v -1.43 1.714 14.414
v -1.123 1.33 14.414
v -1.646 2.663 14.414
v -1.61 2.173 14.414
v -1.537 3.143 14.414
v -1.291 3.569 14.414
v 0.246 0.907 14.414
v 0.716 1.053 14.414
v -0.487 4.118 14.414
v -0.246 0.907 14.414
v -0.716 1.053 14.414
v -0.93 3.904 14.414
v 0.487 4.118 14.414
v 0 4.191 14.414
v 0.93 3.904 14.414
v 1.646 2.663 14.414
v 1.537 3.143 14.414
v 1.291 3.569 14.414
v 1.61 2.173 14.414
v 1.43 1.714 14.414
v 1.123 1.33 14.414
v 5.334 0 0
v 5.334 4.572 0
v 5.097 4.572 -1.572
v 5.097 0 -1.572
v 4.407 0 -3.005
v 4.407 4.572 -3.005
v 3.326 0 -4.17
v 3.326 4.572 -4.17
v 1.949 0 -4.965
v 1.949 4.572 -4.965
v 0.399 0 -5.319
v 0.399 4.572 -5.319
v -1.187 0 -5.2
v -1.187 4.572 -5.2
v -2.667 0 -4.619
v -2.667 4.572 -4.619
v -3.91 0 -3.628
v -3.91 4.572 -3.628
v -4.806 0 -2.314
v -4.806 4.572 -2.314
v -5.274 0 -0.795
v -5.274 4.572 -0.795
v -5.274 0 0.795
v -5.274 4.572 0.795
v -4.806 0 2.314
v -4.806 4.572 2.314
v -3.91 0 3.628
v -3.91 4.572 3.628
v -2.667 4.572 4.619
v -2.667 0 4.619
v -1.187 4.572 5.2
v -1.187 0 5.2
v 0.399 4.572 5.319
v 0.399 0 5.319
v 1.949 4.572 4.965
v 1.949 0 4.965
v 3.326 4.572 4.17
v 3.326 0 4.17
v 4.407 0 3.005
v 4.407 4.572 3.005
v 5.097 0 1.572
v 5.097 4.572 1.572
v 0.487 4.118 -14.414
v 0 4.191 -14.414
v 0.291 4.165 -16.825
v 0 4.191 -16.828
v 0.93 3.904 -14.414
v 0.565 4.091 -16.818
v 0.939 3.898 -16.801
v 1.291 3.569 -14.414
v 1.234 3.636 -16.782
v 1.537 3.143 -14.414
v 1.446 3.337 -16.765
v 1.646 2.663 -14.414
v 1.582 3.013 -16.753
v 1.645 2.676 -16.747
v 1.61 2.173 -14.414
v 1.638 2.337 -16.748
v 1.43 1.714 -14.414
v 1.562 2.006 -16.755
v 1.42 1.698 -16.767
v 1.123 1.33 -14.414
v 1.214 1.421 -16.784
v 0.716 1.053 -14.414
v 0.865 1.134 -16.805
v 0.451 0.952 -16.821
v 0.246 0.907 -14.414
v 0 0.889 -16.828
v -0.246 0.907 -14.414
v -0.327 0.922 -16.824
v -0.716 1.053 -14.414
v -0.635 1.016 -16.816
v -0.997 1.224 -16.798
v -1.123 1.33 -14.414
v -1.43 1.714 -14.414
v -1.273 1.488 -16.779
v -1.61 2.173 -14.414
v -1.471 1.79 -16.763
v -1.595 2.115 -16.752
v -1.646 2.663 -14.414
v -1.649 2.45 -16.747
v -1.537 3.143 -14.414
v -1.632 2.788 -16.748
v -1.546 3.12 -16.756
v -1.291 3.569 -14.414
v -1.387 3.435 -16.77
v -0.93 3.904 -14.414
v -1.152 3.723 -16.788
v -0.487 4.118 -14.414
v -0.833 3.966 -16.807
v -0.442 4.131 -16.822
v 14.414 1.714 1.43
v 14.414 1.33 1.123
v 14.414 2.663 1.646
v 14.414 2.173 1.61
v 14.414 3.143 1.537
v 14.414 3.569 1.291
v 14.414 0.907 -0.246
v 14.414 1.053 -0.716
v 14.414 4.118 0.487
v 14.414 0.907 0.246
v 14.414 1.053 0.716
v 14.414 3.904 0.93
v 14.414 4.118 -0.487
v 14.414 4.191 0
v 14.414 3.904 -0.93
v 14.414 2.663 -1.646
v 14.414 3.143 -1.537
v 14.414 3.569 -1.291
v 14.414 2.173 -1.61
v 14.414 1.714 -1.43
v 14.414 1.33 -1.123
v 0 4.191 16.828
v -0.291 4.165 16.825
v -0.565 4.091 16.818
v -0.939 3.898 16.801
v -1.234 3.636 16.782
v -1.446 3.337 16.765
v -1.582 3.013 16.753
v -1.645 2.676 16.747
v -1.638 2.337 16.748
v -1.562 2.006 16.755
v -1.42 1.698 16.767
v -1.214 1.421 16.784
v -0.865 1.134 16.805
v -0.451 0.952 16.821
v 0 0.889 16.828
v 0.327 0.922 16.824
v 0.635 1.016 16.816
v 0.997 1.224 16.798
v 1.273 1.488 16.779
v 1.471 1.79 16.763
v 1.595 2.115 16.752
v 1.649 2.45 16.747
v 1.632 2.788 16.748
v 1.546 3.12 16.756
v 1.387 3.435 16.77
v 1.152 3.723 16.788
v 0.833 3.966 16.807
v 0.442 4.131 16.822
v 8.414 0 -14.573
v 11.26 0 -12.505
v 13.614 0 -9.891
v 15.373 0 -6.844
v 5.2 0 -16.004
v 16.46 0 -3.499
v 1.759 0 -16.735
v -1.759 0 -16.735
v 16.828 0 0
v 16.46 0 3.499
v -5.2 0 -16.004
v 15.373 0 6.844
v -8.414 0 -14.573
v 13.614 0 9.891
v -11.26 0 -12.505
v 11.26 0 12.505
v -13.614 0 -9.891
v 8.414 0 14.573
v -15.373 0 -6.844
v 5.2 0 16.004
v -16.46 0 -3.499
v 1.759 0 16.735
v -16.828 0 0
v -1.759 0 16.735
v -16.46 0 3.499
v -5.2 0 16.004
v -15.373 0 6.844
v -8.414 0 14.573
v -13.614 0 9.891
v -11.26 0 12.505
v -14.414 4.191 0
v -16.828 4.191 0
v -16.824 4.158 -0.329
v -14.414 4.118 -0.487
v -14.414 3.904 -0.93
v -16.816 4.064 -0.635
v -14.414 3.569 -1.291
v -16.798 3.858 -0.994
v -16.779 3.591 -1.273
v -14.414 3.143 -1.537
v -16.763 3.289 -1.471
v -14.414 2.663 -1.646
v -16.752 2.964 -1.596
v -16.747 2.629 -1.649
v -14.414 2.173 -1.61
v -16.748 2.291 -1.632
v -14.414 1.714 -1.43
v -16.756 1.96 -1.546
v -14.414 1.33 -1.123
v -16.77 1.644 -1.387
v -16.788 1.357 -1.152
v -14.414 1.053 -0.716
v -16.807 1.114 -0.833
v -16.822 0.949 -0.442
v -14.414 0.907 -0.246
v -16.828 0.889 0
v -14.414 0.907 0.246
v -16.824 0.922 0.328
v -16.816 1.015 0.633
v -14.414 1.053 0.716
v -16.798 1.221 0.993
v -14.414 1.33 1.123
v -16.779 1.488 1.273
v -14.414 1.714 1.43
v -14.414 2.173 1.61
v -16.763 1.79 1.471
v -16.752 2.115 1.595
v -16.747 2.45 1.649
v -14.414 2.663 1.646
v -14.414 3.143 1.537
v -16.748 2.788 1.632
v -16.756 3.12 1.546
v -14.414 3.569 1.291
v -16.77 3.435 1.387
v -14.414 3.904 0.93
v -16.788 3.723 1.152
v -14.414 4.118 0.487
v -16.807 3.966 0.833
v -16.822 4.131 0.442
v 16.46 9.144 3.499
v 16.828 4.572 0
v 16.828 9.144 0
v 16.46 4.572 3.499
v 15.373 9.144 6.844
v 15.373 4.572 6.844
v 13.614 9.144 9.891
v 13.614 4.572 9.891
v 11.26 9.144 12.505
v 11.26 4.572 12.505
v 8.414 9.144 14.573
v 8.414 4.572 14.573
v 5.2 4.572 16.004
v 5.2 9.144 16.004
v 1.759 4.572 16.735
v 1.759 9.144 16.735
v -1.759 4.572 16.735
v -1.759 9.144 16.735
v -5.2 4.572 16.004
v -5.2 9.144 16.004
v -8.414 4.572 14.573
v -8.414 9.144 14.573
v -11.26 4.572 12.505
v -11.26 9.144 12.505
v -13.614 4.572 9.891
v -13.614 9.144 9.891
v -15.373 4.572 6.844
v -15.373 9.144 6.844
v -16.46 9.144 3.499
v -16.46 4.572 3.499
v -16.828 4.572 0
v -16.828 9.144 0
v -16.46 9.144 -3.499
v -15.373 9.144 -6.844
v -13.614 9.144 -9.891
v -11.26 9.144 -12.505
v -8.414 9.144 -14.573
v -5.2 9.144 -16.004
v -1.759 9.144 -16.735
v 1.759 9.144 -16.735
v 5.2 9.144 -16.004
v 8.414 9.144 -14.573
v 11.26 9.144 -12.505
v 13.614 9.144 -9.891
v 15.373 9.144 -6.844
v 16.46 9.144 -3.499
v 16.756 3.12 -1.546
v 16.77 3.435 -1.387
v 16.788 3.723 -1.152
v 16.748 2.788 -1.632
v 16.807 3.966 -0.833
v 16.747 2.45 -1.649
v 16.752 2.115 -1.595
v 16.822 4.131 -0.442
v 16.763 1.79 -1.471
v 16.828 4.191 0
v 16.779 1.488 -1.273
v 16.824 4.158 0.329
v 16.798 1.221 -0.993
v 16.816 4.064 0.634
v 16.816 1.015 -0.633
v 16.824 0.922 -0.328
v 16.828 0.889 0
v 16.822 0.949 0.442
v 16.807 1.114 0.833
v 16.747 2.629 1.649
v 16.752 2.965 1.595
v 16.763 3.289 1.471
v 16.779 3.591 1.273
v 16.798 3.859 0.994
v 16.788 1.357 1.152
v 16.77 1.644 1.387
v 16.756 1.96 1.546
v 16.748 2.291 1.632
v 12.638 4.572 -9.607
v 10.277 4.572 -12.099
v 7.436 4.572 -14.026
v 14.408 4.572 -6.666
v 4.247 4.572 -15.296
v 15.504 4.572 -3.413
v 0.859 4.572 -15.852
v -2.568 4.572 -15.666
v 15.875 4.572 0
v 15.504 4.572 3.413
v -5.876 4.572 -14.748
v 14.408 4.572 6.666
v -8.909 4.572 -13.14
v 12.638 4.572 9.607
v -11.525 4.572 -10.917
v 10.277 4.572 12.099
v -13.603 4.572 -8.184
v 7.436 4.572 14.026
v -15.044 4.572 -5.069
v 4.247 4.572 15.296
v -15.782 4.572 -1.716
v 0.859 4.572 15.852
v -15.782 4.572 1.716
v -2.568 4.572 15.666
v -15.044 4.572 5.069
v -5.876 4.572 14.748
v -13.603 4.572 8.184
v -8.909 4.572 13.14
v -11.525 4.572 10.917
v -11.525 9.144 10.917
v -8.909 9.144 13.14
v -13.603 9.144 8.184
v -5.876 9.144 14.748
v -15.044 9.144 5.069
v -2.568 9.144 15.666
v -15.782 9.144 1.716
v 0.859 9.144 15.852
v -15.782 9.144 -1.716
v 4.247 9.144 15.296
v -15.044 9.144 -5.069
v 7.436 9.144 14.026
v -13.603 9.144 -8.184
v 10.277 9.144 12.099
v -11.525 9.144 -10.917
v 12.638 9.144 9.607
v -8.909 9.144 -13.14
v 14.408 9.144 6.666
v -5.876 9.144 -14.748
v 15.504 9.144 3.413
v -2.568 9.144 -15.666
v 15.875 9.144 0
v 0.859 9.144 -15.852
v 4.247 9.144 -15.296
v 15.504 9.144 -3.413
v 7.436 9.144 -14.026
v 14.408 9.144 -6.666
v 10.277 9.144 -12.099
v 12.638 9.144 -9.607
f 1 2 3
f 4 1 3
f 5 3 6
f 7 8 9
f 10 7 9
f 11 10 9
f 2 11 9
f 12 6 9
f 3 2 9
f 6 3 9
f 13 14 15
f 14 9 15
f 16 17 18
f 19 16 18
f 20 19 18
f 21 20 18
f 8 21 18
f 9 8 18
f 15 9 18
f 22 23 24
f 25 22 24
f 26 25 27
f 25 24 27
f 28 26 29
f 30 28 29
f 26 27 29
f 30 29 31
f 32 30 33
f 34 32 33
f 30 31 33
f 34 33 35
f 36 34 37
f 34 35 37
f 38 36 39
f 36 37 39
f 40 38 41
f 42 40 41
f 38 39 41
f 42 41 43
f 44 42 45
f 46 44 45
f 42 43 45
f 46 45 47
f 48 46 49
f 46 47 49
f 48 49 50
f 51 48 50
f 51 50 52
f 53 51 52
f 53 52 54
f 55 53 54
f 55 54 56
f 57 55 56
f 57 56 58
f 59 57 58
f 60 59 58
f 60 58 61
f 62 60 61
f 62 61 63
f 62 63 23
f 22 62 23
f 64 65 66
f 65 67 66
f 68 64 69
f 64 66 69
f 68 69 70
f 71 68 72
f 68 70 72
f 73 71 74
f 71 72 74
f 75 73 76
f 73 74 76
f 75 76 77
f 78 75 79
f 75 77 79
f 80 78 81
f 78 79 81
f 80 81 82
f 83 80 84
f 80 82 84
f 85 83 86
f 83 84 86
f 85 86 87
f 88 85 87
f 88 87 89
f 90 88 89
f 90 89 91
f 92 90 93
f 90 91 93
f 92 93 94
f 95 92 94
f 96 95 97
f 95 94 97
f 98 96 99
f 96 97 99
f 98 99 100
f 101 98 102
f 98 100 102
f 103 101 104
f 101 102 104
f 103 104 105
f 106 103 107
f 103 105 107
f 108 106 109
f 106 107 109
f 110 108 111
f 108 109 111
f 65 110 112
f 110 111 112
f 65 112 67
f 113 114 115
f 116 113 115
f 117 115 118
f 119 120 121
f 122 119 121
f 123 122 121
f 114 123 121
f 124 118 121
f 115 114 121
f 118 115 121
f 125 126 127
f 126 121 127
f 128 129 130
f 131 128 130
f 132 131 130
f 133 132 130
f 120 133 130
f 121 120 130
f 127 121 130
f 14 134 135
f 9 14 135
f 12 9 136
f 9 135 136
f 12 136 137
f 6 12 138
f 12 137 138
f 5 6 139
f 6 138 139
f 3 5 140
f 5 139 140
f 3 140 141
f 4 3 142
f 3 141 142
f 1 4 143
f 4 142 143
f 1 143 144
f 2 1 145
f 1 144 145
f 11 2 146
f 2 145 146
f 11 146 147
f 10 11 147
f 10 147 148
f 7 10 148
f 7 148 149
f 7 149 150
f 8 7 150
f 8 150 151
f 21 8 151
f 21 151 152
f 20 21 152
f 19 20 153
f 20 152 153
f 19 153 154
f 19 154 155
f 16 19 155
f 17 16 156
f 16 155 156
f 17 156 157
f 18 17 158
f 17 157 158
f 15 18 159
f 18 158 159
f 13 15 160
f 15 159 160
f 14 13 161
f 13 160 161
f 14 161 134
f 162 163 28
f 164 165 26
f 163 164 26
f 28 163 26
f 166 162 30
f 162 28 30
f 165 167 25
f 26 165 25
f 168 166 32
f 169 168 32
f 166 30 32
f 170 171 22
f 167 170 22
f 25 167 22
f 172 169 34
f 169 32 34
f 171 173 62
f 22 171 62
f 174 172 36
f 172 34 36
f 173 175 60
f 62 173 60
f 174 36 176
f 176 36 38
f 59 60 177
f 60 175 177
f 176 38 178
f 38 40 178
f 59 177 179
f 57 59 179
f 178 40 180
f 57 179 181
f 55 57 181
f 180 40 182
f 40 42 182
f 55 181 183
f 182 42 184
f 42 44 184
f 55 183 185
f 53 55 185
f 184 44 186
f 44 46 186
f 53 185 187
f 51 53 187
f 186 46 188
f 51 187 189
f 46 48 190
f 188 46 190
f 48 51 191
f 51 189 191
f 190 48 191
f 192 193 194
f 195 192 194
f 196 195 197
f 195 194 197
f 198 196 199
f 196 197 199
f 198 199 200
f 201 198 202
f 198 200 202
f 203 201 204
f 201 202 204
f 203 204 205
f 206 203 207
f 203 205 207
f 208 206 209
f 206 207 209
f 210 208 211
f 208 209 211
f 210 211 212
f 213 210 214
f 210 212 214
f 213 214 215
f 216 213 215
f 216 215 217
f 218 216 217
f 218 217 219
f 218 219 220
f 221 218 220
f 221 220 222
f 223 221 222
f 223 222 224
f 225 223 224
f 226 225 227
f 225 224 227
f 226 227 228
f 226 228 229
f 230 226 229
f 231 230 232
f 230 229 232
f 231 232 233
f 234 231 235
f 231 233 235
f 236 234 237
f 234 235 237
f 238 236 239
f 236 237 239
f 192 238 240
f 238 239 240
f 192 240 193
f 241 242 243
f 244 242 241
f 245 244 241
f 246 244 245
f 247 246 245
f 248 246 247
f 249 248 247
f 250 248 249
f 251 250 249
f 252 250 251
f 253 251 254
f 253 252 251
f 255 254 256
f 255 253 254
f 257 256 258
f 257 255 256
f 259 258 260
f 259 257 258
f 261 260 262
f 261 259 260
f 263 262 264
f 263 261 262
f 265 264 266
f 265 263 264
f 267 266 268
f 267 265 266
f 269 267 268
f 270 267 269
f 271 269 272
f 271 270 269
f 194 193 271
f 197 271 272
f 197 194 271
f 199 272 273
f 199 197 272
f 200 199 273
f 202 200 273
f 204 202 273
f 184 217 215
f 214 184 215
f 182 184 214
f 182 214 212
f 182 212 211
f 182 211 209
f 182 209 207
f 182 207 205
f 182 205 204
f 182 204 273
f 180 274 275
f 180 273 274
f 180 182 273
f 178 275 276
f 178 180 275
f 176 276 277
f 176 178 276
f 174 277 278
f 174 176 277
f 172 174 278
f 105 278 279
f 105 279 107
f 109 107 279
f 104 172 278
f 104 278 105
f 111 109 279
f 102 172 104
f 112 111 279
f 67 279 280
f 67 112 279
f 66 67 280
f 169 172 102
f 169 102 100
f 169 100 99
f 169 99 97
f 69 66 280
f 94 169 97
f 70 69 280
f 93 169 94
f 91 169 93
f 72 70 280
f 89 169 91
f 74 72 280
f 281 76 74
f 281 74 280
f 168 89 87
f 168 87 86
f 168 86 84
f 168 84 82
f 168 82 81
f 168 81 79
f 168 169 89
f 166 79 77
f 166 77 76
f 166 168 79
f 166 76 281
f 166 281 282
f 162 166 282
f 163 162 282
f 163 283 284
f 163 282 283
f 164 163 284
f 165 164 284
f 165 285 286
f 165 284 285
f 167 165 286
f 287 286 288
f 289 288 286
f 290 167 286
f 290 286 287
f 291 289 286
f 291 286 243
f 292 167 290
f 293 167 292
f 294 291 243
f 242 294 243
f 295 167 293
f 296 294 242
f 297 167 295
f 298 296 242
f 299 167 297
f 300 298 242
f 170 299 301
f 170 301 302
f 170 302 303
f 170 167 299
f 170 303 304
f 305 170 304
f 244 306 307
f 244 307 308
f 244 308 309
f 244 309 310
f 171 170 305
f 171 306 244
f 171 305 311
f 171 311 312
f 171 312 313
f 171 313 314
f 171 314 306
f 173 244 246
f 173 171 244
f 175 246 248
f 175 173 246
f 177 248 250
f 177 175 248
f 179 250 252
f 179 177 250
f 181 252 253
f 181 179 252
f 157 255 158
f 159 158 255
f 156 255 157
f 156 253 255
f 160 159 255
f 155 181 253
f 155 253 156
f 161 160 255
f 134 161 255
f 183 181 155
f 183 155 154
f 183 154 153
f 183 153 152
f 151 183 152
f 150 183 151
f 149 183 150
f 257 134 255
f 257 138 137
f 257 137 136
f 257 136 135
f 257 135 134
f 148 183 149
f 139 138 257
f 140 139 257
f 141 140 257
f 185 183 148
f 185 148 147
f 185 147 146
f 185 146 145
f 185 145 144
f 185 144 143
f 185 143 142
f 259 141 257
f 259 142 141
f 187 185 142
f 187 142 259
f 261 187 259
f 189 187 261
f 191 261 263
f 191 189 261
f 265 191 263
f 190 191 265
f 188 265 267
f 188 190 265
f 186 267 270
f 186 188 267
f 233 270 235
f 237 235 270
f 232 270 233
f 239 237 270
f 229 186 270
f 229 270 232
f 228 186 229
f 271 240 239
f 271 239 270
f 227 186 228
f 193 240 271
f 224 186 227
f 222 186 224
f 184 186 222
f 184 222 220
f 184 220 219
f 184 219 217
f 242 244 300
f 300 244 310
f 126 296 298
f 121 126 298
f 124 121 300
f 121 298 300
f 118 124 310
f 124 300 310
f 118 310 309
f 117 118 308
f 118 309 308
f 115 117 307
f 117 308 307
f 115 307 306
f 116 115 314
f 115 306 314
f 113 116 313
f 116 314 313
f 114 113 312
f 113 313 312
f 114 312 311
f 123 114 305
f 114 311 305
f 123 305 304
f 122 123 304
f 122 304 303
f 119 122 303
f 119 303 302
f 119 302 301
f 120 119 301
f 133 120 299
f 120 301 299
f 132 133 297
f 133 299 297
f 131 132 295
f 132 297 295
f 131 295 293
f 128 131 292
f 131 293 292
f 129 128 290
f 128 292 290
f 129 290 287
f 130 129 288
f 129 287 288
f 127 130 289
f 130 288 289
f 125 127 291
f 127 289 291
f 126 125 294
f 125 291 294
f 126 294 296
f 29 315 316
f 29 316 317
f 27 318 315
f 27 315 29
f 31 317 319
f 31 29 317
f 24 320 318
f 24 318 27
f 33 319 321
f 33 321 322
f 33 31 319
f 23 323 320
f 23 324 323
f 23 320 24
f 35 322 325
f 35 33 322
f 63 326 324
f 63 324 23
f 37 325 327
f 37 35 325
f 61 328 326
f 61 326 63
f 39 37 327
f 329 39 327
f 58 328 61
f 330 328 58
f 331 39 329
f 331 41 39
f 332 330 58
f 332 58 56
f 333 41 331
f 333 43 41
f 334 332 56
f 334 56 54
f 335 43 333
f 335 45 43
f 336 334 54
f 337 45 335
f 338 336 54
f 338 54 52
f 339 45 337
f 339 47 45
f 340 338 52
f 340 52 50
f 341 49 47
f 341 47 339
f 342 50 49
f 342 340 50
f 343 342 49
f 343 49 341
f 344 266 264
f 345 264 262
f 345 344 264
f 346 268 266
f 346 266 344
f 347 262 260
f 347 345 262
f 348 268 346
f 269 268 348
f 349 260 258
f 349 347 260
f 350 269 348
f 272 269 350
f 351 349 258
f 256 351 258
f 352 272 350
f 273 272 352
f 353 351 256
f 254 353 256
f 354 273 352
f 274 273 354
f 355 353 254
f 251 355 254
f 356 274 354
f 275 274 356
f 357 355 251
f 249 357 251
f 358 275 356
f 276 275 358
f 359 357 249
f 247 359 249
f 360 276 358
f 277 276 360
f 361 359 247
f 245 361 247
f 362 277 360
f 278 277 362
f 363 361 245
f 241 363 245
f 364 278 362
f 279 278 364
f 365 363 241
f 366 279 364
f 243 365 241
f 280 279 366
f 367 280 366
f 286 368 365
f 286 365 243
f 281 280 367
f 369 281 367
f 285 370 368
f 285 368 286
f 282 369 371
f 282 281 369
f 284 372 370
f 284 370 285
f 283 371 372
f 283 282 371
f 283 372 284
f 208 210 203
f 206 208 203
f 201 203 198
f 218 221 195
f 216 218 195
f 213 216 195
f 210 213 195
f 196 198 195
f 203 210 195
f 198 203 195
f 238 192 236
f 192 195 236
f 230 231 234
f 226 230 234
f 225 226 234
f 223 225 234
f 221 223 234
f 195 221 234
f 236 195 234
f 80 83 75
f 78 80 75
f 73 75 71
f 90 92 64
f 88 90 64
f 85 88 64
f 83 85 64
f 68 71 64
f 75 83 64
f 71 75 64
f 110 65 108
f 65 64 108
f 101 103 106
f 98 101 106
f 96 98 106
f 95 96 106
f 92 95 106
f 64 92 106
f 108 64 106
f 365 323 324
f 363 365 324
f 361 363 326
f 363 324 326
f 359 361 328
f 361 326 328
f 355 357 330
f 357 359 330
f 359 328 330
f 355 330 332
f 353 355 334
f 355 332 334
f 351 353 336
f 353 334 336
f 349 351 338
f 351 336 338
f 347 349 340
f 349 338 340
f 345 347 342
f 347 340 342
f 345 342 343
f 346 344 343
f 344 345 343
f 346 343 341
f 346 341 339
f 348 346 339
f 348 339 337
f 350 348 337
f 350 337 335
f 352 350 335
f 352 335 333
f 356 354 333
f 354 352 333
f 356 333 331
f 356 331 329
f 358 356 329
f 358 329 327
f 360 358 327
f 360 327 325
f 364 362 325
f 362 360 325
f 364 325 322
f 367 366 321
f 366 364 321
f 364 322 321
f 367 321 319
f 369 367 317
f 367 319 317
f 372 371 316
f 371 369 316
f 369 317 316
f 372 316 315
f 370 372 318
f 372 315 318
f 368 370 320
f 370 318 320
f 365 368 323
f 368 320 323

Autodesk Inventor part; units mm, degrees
ref_plane "XZ Plane" through (0, 0, 0) normal (0, 1, 0) x (-1, 0, 0)
ref_plane "XY Plane" through (0, 0, 0) normal (0, 0, 1) x (1, 0, 0)
sketch "Sketch1" plane through (0, 0, 0) normal (0, 1, 0) x (-1, 0, 0)
  circle A0 centre (0, 0) radius 16.8275
  dimension "d0" = 33.655
extrude "Extrusion1" add sketch "Sketch1" along normal blind 4.572
sketch "Sketch2" plane through (0, 4.572, 0) normal (0, 1, 0) x (1, 0, 0)
  circle A0 centre (0, 0) radius 15.875
  circle A1 centre (0, 0) radius 16.8275 projected
  dimension "d3" = 31.75
extrude "Extrusion2" add sketch "Sketch2" along normal blind 4.572
ref_plane "Work Plane1" through (-16.8275, 0, 0) normal (1, 0, 0) x (0, 1, 0)
sketch "Sketch3" plane through (-16.8275, 0, 0) normal (1, 0, 0) x (0, 1, 0)
  circle A0 centre (2.54, 0) radius 1.651
  line L0 (0, 16.8275) -> (0, -16.8275) projected
  point P0 (0, 0)
  dimension "d6" = 3.302
  dimension "d7" = 2.54
extrude "Extrusion3" cut sketch "Sketch3" along normal blind 2.413
pattern_circular "Circular Pattern1" count 4 over 360 about axis through (0, 0, 0) along (0, 1, 0) of "Extrusion3"
sketch "Sketch4" plane through (0, 4.572, 0) normal (0, 1, 0) x (1, 0, 0)
  circle A0 centre (0, 0) radius 5.334
  dimension "d13" = 10.668
extrude "Extrusion4" cut sketch "Sketch4" against normal blind 25.4
properties part number "BallastThrustWasherSpacer" material "ABS Plastic"
